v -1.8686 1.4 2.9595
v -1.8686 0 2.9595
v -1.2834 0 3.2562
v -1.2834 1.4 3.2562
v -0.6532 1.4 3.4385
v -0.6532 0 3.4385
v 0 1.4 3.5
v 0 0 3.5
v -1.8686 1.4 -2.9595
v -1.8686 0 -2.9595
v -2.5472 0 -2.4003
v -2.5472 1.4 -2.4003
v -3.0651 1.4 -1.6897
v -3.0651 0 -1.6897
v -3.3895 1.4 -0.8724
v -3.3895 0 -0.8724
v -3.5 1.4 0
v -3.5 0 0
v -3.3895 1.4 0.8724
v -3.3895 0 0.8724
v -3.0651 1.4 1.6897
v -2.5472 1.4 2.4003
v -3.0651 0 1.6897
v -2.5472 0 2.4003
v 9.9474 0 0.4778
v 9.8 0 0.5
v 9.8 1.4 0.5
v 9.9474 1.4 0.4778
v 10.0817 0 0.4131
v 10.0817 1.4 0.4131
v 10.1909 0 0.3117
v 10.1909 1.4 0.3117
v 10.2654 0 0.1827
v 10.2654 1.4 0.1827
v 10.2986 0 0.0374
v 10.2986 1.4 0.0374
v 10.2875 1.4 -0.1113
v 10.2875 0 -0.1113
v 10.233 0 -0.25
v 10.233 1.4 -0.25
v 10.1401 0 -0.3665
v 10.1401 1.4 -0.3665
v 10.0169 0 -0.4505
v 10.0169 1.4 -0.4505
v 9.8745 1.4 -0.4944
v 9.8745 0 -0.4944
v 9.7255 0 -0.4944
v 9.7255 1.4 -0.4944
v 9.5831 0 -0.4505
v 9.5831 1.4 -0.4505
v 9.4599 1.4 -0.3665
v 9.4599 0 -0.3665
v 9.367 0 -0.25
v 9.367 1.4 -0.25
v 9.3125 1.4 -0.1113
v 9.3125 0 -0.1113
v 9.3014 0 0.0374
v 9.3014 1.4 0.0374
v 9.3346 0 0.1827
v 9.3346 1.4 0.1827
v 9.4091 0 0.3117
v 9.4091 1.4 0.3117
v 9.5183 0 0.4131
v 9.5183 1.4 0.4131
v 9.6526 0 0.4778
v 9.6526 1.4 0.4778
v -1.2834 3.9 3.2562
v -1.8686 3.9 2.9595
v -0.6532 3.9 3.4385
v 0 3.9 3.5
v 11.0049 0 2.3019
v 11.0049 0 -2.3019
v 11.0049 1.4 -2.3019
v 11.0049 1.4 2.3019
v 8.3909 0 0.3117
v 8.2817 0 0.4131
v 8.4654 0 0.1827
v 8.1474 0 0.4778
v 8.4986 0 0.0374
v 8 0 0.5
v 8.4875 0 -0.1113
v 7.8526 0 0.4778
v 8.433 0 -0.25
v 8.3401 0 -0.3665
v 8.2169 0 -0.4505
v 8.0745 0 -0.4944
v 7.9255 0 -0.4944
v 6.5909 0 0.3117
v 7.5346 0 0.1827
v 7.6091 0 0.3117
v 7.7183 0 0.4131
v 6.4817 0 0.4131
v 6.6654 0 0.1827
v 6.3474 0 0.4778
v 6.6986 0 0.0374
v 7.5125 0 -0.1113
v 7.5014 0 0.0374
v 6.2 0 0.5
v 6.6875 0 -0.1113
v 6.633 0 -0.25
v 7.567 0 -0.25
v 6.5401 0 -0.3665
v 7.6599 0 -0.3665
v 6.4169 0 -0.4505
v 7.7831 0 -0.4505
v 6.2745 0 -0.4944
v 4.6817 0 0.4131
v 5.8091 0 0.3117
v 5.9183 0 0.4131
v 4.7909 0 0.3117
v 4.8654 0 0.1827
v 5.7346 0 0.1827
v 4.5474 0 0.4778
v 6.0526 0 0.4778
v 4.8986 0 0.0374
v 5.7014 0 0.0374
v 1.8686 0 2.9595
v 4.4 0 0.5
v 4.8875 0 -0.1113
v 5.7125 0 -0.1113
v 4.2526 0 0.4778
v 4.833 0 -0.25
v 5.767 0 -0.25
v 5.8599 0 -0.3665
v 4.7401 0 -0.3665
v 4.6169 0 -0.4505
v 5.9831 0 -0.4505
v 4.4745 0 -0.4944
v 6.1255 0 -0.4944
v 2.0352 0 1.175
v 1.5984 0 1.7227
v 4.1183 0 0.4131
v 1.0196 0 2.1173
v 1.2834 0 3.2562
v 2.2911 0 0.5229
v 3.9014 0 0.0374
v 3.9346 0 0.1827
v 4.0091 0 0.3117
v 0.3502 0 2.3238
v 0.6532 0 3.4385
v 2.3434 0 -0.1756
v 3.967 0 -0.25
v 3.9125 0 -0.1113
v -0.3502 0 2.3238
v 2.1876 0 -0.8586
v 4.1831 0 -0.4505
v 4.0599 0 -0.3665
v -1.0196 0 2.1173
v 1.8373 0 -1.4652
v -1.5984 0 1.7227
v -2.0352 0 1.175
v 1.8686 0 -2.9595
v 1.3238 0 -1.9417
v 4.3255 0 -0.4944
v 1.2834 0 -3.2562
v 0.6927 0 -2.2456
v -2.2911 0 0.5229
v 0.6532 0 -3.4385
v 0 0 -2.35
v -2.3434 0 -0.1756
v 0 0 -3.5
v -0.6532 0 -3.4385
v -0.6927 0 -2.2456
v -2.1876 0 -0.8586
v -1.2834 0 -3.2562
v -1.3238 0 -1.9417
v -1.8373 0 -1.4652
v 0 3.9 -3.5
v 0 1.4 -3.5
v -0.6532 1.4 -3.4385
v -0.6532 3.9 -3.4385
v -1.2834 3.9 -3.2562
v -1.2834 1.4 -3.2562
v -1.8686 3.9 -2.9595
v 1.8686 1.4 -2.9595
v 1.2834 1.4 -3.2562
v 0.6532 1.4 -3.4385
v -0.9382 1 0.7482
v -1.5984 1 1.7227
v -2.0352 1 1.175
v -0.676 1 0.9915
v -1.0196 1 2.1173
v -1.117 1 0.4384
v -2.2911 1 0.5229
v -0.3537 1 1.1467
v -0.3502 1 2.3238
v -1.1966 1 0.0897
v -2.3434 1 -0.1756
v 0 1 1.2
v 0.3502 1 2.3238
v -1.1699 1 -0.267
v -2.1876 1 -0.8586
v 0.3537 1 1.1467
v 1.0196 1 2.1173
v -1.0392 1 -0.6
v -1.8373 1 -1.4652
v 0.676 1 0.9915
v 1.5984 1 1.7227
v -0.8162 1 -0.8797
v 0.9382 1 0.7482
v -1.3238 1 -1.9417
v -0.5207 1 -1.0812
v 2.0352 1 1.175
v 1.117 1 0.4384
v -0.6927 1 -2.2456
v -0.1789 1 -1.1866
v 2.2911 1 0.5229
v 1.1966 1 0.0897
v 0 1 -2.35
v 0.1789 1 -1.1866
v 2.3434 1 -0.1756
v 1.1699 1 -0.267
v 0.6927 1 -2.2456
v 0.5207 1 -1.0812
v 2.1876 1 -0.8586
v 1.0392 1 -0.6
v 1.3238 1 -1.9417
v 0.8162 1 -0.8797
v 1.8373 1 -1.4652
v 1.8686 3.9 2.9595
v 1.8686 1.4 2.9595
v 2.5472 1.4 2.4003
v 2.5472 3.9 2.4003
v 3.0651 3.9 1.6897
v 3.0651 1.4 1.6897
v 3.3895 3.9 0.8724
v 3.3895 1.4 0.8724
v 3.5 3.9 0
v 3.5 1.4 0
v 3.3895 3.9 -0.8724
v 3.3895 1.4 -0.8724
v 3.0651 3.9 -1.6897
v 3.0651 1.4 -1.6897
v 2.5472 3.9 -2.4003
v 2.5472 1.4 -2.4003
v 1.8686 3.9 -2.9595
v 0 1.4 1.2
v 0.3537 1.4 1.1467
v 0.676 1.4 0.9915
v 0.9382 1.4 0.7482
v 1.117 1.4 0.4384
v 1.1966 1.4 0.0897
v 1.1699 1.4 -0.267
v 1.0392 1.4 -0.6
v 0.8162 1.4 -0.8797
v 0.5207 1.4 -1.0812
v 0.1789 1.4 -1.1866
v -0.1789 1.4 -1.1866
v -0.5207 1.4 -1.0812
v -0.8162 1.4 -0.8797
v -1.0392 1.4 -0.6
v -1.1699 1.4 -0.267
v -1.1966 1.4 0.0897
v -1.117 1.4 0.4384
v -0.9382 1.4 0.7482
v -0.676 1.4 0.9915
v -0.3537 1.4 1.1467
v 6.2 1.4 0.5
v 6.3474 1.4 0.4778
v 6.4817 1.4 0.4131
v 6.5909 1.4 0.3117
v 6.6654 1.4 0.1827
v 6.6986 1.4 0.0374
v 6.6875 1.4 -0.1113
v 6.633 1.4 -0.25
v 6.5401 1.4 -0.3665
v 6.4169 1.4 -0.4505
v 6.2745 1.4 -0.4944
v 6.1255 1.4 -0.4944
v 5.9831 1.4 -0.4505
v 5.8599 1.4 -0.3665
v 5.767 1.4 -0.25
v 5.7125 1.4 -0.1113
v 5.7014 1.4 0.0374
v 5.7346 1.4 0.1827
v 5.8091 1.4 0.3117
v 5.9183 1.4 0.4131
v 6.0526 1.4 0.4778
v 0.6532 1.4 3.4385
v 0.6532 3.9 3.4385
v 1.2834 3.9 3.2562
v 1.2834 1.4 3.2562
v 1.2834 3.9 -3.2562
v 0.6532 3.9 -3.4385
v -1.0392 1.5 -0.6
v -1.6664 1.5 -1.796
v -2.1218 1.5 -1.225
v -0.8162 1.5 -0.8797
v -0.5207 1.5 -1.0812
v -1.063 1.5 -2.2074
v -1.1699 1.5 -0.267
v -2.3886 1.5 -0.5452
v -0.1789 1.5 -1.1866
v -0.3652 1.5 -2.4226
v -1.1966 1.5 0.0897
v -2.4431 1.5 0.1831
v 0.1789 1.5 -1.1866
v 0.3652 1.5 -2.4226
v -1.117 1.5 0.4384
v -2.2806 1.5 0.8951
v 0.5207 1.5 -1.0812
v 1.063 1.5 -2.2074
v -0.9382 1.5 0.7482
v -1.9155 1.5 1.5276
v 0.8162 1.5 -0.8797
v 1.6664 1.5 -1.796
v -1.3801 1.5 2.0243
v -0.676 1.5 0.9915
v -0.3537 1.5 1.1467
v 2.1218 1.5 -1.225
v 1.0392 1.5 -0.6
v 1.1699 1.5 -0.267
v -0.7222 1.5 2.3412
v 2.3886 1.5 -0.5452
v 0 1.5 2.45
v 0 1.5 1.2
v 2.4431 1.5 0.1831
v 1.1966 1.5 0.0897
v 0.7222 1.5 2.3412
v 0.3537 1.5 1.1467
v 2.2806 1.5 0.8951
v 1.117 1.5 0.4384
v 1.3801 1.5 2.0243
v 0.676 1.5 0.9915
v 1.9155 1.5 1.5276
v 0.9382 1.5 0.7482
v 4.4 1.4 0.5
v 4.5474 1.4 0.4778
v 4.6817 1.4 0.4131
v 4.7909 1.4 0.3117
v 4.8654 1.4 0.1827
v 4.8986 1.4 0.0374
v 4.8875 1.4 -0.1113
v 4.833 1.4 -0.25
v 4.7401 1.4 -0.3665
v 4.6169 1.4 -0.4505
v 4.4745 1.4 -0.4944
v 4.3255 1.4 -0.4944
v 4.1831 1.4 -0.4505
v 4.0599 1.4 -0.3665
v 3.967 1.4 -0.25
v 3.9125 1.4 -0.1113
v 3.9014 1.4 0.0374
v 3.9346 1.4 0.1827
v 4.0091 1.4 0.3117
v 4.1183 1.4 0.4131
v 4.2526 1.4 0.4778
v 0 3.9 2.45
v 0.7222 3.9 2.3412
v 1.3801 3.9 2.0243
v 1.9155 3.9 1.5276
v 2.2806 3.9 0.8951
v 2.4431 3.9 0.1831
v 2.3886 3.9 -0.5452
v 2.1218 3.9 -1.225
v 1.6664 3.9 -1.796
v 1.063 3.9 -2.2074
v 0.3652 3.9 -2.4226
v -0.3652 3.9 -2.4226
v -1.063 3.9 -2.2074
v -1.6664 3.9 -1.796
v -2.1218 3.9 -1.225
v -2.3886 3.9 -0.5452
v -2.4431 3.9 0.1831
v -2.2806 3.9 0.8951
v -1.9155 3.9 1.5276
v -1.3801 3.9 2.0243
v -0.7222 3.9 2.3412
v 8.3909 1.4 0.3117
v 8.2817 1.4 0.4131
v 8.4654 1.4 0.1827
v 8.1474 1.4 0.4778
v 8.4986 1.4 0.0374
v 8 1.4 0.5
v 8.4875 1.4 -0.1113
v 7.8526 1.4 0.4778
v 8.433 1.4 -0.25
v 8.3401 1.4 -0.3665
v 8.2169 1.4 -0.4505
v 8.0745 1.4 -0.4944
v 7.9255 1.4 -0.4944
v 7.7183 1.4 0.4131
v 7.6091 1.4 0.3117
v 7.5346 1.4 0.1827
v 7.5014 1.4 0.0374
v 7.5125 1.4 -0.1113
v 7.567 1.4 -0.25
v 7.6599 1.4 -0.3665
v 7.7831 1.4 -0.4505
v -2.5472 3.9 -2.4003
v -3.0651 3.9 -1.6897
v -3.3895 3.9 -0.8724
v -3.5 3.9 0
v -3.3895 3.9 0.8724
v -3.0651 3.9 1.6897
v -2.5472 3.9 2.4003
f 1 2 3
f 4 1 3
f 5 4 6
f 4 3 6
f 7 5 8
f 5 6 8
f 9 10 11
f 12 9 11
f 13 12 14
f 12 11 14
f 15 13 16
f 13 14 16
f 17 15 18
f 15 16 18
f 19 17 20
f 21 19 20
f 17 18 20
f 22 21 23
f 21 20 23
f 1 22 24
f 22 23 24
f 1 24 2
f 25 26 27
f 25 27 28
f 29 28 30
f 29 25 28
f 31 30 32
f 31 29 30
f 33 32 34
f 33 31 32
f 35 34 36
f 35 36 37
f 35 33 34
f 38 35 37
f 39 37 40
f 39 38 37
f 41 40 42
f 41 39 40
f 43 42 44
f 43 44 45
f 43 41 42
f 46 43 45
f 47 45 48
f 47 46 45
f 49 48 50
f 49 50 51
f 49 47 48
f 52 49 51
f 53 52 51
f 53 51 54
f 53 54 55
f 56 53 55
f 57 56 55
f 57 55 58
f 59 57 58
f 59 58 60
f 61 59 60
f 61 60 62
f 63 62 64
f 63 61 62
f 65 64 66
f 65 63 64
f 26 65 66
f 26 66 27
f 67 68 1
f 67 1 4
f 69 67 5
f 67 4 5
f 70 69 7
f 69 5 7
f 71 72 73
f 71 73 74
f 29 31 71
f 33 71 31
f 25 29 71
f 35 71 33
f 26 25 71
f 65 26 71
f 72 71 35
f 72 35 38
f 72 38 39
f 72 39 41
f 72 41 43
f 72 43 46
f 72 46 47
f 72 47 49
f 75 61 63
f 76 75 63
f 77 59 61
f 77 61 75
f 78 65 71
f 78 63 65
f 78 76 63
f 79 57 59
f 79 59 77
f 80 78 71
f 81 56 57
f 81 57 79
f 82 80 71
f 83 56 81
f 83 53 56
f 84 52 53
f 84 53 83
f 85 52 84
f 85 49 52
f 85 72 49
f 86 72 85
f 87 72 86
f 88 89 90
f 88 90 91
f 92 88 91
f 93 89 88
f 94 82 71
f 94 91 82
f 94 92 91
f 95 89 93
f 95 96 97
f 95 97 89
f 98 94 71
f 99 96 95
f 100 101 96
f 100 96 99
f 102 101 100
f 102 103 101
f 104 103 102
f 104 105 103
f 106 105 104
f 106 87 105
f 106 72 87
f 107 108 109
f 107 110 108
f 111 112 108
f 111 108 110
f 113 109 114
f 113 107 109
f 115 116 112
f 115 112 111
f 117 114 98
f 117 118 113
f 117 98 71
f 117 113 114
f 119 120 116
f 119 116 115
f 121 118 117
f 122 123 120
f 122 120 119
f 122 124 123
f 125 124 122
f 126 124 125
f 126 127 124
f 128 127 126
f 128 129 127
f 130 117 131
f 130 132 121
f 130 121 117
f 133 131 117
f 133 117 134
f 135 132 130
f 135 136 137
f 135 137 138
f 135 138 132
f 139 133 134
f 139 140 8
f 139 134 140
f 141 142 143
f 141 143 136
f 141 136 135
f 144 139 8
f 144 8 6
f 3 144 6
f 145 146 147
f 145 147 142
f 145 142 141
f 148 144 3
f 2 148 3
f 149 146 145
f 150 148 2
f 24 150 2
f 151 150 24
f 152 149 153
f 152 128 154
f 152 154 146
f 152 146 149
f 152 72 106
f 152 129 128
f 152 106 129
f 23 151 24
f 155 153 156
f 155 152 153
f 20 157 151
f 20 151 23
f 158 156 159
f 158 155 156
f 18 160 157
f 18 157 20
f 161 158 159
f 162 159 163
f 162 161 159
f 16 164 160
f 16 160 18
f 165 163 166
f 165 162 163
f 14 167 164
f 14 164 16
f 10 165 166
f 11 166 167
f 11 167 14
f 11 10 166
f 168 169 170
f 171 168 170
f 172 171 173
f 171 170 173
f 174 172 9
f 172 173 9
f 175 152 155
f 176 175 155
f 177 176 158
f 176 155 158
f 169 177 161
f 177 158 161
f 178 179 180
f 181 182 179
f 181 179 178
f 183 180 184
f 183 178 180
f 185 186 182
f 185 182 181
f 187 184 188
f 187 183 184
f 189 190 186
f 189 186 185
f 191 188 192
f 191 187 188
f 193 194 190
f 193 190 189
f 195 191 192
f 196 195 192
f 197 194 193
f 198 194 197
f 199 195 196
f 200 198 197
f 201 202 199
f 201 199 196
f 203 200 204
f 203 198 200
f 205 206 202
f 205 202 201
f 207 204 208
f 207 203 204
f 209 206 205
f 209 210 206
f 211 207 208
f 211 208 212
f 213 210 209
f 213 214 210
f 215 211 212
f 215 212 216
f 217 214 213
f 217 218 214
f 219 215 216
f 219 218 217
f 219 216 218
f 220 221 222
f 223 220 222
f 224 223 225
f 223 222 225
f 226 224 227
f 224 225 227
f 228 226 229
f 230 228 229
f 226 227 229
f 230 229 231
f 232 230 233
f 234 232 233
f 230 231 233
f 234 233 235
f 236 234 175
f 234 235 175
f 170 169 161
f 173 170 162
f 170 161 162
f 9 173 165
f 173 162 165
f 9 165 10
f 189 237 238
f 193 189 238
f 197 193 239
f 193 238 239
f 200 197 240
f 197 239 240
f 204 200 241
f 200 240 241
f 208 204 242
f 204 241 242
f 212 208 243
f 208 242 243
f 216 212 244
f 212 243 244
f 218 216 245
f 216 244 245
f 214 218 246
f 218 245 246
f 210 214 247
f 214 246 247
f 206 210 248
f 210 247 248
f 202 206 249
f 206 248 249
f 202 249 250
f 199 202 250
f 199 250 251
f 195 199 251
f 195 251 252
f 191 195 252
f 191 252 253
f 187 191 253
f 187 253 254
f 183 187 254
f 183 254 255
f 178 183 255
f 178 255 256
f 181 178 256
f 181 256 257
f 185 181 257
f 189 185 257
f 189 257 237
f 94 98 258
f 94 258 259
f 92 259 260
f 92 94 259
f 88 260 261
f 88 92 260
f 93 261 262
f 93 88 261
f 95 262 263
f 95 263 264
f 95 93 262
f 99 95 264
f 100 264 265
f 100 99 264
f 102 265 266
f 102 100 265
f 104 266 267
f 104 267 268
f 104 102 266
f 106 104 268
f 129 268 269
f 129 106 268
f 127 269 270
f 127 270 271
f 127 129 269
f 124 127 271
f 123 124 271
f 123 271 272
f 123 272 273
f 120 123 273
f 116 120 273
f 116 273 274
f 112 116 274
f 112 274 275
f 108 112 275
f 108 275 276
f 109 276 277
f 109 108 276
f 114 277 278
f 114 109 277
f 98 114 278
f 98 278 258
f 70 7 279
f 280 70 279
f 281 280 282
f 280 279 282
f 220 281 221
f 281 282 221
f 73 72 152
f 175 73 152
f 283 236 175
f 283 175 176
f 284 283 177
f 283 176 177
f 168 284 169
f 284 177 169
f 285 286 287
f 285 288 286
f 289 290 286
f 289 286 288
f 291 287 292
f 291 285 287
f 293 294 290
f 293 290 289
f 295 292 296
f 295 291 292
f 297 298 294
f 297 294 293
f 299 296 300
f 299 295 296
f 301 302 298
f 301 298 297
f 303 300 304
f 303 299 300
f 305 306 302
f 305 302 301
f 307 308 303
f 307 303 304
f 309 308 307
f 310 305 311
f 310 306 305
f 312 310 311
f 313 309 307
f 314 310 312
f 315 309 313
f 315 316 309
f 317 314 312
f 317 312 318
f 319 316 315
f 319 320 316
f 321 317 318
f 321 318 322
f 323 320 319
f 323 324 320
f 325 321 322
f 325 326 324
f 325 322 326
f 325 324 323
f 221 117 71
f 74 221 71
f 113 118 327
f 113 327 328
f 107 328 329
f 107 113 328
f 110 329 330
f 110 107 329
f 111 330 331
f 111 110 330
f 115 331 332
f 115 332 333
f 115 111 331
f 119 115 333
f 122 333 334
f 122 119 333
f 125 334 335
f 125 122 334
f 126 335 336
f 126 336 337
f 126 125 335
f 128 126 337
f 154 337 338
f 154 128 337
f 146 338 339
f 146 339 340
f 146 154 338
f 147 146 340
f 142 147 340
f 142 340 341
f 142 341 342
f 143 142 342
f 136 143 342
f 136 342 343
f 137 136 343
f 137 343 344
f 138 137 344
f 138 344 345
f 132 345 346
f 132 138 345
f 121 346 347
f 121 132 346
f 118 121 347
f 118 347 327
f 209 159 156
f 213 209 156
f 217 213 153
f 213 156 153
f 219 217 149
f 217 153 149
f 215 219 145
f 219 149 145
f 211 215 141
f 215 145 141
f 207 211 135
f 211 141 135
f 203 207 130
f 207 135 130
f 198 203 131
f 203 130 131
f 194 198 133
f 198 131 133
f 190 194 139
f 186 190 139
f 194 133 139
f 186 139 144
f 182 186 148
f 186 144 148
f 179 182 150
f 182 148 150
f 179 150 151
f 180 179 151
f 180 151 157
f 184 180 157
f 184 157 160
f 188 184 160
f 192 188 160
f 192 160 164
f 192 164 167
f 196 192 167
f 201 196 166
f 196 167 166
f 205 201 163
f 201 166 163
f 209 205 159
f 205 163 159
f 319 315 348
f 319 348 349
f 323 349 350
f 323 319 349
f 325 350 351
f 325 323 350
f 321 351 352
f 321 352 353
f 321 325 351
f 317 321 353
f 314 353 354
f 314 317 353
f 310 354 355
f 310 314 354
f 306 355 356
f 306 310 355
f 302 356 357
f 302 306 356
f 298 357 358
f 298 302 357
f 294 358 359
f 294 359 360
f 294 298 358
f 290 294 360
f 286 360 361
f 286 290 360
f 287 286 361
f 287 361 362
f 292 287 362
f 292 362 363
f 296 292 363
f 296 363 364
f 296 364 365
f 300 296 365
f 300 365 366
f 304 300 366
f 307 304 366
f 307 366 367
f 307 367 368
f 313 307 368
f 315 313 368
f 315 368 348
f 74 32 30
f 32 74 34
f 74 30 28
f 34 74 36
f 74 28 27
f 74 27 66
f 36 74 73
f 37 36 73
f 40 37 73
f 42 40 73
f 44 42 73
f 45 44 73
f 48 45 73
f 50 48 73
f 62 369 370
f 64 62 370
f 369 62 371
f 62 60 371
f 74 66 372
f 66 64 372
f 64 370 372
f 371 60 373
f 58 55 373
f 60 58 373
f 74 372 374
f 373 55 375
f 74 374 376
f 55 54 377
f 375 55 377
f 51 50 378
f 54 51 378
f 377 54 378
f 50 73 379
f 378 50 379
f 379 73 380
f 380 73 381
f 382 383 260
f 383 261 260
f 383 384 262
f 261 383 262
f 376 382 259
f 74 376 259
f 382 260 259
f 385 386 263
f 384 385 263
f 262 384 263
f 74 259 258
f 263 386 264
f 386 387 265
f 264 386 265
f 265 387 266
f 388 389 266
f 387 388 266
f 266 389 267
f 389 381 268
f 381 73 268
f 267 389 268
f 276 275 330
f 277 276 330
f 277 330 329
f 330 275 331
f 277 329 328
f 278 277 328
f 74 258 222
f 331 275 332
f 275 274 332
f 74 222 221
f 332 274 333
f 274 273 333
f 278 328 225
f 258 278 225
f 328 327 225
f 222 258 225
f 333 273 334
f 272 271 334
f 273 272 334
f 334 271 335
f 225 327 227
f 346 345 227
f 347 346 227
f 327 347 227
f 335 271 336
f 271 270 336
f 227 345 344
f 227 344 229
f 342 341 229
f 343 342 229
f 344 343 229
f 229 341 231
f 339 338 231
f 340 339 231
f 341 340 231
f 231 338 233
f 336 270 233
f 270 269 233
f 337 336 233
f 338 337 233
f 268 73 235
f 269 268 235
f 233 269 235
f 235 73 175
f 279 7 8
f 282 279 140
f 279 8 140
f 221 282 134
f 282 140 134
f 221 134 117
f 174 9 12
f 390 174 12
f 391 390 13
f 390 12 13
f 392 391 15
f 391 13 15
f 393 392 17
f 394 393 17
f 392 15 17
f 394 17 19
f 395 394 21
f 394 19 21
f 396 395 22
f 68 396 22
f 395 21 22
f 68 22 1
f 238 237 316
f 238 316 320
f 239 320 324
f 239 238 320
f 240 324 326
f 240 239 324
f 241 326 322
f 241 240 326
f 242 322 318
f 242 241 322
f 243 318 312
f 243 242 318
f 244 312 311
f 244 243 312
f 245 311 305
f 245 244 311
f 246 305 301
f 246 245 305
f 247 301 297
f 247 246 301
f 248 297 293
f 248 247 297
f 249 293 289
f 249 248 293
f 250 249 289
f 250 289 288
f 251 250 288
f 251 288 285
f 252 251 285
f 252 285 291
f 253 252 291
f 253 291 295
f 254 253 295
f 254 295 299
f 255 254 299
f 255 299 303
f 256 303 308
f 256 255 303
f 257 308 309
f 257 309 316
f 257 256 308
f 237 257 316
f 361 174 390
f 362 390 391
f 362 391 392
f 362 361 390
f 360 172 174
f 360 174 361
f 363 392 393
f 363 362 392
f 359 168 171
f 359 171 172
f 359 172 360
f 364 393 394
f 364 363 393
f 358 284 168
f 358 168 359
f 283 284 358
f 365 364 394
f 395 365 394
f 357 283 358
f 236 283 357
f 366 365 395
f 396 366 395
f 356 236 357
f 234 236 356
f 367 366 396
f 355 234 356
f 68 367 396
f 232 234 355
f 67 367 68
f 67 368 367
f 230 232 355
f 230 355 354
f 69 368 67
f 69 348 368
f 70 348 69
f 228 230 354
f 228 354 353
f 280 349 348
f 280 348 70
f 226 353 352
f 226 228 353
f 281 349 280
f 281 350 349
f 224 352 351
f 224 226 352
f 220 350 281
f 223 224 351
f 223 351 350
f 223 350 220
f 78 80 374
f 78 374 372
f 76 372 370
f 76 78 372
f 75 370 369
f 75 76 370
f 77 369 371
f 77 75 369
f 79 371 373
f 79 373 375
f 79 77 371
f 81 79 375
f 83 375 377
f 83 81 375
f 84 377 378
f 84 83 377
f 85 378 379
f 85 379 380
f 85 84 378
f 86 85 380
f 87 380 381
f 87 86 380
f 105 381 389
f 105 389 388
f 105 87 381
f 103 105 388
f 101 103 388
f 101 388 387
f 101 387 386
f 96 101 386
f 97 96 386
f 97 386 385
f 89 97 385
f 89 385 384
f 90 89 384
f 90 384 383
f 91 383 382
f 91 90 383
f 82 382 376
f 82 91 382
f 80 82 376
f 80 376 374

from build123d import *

# Parameters (mm, degrees)
SKETCH1_R           = 0.5
BOSS_EXTRUDE1_DEPTH = 1.4
SKETCH2_R           = 2.35
CUT_EXTRUDE1_DEPTH  = 1
SKETCH3_R           = 3.5
SKETCH3_R_2         = 2.45
BOSS_EXTRUDE2_DEPTH = 2.5
SKETCH4_R           = 1.2
CUT_EXTRUDE2_DEPTH  = 20.282440198
SKETCH5_R           = 2.45
SKETCH5_R_2         = 1.2
BOSS_EXTRUDE3_DEPTH = 0.1
SKETCH6_W           = 35.735260114
SKETCH6_H           = 17.672039004
CUT_EXTRUDE4_DEPTH  = 20.513392837
CUT_EXTRUDE5_DEPTH  = 18.980545042


with BuildPart() as part:
    # Sketch1 → Boss-Extrude1 (new body)
    with BuildSketch(Plane(origin=(0, 0, 0), x_dir=(1, 0, 0), z_dir=(0, 1, 0))):
        with BuildLine():
            Line((-15.2, 2), (-2, 2.95))
            Line((-2, 2.95), (-2, 6.35))
            ThreePointArc((-2, 6.35), (0, 8.35), (2, 6.35))
            Line((2, 6.35), (2, 3.5))
            Line((2, 3.5), (11.004916923, 2.476713986))
            Line((11.004916923, 2.476713986), (11.004916923, -2.476713986))
            Line((11.004916923, -2.476713986), (2, -3.5))
            Line((2, -3.5), (2, -6.35))
            ThreePointArc((2, -6.35), (0, -8.35), (-2, -6.35))
            Line((-2, -6.35), (-2, -2.95))
            Line((-2, -2.95), (-15.2, -2))
            ThreePointArc((-15.2, -2), (-17.2, 0), (-15.2, 2))
        make_face()
        with Locations(Location((0, 6.35, 0), (0, 0, 270))):
            Circle(SKETCH1_R, mode=Mode.SUBTRACT)
        with Locations(Location((0, 4.55, 0), (0, 0, 270))):
            Circle(SKETCH1_R, mode=Mode.SUBTRACT)
        with Locations(Location((0, -4.55, 0), (0, 0, 90))):
            Circle(SKETCH1_R, mode=Mode.SUBTRACT)
        with Locations(Location((0, -6.35, 0), (0, 0, 90))):
            Circle(SKETCH1_R, mode=Mode.SUBTRACT)
        with Locations(Location((-15.2, 0, 0), (0, 0, 270))):
            Circle(SKETCH1_R, mode=Mode.SUBTRACT)
        with Locations(Location((-13.4, 0, 0), (0, 0, 270))):
            Circle(SKETCH1_R, mode=Mode.SUBTRACT)
        with Locations(Location((-11.6, 0, 0), (0, 0, 270))):
            Circle(SKETCH1_R, mode=Mode.SUBTRACT)
        with Locations(Location((-9.8, 0, 0), (0, 0, 270))):
            Circle(SKETCH1_R, mode=Mode.SUBTRACT)
        with Locations(Location((-8, 0, 0), (0, 0, 270))):
            Circle(SKETCH1_R, mode=Mode.SUBTRACT)
        with Locations(Location((-6.2, 0, 0), (0, 0, 270))):
            Circle(SKETCH1_R, mode=Mode.SUBTRACT)
        with Locations(Location((-4.4, 0, 0), (0, 0, 270))):
            Circle(SKETCH1_R, mode=Mode.SUBTRACT)
        with Locations(Location((9.8, 0, 0), (0, 0, 270))):
            Circle(SKETCH1_R, mode=Mode.SUBTRACT)
        with Locations(Location((8, 0, 0), (0, 0, 270))):
            Circle(SKETCH1_R, mode=Mode.SUBTRACT)
        with Locations(Location((6.2, 0, 0), (0, 0, 270))):
            Circle(SKETCH1_R, mode=Mode.SUBTRACT)
        with Locations(Location((4.4, 0, 0), (0, 0, 270))):
            Circle(SKETCH1_R, mode=Mode.SUBTRACT)
    extrude(amount=BOSS_EXTRUDE1_DEPTH)

    # Sketch2 → Cut-Extrude1 (cut)
    with BuildSketch(Plane.XZ):
        with Locations(Location((0, 0, 0), (0, 0, 270))):
            Circle(SKETCH2_R)
    extrude(amount=-CUT_EXTRUDE1_DEPTH, mode=Mode.SUBTRACT)

    # Sketch3 → Boss-Extrude2 (add)
    with BuildSketch(Plane(origin=(0, 1.4, 0), x_dir=(1, 0, 0), z_dir=(0, 1, 0))):
        with Locations(Location((0, 0, 0), (0, 0, 270))):
            Circle(SKETCH3_R)
        with Locations(Location((0, 0, 0), (0, 0, 270))):
            Circle(SKETCH3_R_2, mode=Mode.SUBTRACT)
    extrude(amount=BOSS_EXTRUDE2_DEPTH)

    # Sketch4 → Cut-Extrude2 (cut, through all)
    with BuildSketch(Plane(origin=(0, 1.4, 0), x_dir=(1, 0, 0), z_dir=(0, 1, 0))):
        with Locations(Location((0, 0, 0), (0, 0, 270))):
            Circle(SKETCH4_R)
    extrude(amount=-CUT_EXTRUDE2_DEPTH, mode=Mode.SUBTRACT)

    # Sketch5 → Boss-Extrude3 (add)
    with BuildSketch(Plane(origin=(0, 1.4, 0), x_dir=(1, 0, 0), z_dir=(0, 1, 0))):
        with Locations(Location((0, 0, 0), (0, 0, 270))):
            Circle(SKETCH5_R)
        with Locations(Location((0, 0, 0), (0, 0, 270))):
            Circle(SKETCH5_R_2, mode=Mode.SUBTRACT)
    extrude(amount=BOSS_EXTRUDE3_DEPTH)

    # Sketch6 → Cut-Extrude4 (cut, through all)
    with BuildSketch(Plane.XZ):
        Rectangle(SKETCH6_W, SKETCH6_H)
        with BuildLine():
            Line((-1.868584713, -2.959457918), (-15.2, -2))
            ThreePointArc((-15.2, -2), (-17.2, 0), (-15.2, 2))
            Line((-15.2, 2), (-1.868584713, 2.959457918))
            ThreePointArc((-1.868584713, 2.959457918), (0, 3.5), (1.868584713, 2.959457918))
            Line((1.868584713, 2.959457918), (15.2, 2))
            ThreePointArc((15.2, 2), (17.2, 0), (15.2, -2))
            Line((15.2, -2), (1.868584713, -2.959457918))
            ThreePointArc((1.868584713, -2.959457918), (0, -3.5), (-1.868584713, -2.959457918))
        make_face(mode=Mode.SUBTRACT)
    extrude(amount=-CUT_EXTRUDE4_DEPTH, mode=Mode.SUBTRACT)

    # Sketch7 → Cut-Extrude5 (cut, through all)
    with BuildSketch(Plane.XZ):
        with BuildLine():
            Line((0, 3.5), (-17.731768104, 3.5))
            Line((-17.731768104, 3.5), (-17.731768104, -3.5))
            Line((-17.731768104, -3.5), (0, -3.5))
            ThreePointArc((0, -3.5), (-3.5, 0), (0, 3.5))
        make_face()
    extrude(amount=-CUT_EXTRUDE5_DEPTH, mode=Mode.SUBTRACT)


solid = part.part
